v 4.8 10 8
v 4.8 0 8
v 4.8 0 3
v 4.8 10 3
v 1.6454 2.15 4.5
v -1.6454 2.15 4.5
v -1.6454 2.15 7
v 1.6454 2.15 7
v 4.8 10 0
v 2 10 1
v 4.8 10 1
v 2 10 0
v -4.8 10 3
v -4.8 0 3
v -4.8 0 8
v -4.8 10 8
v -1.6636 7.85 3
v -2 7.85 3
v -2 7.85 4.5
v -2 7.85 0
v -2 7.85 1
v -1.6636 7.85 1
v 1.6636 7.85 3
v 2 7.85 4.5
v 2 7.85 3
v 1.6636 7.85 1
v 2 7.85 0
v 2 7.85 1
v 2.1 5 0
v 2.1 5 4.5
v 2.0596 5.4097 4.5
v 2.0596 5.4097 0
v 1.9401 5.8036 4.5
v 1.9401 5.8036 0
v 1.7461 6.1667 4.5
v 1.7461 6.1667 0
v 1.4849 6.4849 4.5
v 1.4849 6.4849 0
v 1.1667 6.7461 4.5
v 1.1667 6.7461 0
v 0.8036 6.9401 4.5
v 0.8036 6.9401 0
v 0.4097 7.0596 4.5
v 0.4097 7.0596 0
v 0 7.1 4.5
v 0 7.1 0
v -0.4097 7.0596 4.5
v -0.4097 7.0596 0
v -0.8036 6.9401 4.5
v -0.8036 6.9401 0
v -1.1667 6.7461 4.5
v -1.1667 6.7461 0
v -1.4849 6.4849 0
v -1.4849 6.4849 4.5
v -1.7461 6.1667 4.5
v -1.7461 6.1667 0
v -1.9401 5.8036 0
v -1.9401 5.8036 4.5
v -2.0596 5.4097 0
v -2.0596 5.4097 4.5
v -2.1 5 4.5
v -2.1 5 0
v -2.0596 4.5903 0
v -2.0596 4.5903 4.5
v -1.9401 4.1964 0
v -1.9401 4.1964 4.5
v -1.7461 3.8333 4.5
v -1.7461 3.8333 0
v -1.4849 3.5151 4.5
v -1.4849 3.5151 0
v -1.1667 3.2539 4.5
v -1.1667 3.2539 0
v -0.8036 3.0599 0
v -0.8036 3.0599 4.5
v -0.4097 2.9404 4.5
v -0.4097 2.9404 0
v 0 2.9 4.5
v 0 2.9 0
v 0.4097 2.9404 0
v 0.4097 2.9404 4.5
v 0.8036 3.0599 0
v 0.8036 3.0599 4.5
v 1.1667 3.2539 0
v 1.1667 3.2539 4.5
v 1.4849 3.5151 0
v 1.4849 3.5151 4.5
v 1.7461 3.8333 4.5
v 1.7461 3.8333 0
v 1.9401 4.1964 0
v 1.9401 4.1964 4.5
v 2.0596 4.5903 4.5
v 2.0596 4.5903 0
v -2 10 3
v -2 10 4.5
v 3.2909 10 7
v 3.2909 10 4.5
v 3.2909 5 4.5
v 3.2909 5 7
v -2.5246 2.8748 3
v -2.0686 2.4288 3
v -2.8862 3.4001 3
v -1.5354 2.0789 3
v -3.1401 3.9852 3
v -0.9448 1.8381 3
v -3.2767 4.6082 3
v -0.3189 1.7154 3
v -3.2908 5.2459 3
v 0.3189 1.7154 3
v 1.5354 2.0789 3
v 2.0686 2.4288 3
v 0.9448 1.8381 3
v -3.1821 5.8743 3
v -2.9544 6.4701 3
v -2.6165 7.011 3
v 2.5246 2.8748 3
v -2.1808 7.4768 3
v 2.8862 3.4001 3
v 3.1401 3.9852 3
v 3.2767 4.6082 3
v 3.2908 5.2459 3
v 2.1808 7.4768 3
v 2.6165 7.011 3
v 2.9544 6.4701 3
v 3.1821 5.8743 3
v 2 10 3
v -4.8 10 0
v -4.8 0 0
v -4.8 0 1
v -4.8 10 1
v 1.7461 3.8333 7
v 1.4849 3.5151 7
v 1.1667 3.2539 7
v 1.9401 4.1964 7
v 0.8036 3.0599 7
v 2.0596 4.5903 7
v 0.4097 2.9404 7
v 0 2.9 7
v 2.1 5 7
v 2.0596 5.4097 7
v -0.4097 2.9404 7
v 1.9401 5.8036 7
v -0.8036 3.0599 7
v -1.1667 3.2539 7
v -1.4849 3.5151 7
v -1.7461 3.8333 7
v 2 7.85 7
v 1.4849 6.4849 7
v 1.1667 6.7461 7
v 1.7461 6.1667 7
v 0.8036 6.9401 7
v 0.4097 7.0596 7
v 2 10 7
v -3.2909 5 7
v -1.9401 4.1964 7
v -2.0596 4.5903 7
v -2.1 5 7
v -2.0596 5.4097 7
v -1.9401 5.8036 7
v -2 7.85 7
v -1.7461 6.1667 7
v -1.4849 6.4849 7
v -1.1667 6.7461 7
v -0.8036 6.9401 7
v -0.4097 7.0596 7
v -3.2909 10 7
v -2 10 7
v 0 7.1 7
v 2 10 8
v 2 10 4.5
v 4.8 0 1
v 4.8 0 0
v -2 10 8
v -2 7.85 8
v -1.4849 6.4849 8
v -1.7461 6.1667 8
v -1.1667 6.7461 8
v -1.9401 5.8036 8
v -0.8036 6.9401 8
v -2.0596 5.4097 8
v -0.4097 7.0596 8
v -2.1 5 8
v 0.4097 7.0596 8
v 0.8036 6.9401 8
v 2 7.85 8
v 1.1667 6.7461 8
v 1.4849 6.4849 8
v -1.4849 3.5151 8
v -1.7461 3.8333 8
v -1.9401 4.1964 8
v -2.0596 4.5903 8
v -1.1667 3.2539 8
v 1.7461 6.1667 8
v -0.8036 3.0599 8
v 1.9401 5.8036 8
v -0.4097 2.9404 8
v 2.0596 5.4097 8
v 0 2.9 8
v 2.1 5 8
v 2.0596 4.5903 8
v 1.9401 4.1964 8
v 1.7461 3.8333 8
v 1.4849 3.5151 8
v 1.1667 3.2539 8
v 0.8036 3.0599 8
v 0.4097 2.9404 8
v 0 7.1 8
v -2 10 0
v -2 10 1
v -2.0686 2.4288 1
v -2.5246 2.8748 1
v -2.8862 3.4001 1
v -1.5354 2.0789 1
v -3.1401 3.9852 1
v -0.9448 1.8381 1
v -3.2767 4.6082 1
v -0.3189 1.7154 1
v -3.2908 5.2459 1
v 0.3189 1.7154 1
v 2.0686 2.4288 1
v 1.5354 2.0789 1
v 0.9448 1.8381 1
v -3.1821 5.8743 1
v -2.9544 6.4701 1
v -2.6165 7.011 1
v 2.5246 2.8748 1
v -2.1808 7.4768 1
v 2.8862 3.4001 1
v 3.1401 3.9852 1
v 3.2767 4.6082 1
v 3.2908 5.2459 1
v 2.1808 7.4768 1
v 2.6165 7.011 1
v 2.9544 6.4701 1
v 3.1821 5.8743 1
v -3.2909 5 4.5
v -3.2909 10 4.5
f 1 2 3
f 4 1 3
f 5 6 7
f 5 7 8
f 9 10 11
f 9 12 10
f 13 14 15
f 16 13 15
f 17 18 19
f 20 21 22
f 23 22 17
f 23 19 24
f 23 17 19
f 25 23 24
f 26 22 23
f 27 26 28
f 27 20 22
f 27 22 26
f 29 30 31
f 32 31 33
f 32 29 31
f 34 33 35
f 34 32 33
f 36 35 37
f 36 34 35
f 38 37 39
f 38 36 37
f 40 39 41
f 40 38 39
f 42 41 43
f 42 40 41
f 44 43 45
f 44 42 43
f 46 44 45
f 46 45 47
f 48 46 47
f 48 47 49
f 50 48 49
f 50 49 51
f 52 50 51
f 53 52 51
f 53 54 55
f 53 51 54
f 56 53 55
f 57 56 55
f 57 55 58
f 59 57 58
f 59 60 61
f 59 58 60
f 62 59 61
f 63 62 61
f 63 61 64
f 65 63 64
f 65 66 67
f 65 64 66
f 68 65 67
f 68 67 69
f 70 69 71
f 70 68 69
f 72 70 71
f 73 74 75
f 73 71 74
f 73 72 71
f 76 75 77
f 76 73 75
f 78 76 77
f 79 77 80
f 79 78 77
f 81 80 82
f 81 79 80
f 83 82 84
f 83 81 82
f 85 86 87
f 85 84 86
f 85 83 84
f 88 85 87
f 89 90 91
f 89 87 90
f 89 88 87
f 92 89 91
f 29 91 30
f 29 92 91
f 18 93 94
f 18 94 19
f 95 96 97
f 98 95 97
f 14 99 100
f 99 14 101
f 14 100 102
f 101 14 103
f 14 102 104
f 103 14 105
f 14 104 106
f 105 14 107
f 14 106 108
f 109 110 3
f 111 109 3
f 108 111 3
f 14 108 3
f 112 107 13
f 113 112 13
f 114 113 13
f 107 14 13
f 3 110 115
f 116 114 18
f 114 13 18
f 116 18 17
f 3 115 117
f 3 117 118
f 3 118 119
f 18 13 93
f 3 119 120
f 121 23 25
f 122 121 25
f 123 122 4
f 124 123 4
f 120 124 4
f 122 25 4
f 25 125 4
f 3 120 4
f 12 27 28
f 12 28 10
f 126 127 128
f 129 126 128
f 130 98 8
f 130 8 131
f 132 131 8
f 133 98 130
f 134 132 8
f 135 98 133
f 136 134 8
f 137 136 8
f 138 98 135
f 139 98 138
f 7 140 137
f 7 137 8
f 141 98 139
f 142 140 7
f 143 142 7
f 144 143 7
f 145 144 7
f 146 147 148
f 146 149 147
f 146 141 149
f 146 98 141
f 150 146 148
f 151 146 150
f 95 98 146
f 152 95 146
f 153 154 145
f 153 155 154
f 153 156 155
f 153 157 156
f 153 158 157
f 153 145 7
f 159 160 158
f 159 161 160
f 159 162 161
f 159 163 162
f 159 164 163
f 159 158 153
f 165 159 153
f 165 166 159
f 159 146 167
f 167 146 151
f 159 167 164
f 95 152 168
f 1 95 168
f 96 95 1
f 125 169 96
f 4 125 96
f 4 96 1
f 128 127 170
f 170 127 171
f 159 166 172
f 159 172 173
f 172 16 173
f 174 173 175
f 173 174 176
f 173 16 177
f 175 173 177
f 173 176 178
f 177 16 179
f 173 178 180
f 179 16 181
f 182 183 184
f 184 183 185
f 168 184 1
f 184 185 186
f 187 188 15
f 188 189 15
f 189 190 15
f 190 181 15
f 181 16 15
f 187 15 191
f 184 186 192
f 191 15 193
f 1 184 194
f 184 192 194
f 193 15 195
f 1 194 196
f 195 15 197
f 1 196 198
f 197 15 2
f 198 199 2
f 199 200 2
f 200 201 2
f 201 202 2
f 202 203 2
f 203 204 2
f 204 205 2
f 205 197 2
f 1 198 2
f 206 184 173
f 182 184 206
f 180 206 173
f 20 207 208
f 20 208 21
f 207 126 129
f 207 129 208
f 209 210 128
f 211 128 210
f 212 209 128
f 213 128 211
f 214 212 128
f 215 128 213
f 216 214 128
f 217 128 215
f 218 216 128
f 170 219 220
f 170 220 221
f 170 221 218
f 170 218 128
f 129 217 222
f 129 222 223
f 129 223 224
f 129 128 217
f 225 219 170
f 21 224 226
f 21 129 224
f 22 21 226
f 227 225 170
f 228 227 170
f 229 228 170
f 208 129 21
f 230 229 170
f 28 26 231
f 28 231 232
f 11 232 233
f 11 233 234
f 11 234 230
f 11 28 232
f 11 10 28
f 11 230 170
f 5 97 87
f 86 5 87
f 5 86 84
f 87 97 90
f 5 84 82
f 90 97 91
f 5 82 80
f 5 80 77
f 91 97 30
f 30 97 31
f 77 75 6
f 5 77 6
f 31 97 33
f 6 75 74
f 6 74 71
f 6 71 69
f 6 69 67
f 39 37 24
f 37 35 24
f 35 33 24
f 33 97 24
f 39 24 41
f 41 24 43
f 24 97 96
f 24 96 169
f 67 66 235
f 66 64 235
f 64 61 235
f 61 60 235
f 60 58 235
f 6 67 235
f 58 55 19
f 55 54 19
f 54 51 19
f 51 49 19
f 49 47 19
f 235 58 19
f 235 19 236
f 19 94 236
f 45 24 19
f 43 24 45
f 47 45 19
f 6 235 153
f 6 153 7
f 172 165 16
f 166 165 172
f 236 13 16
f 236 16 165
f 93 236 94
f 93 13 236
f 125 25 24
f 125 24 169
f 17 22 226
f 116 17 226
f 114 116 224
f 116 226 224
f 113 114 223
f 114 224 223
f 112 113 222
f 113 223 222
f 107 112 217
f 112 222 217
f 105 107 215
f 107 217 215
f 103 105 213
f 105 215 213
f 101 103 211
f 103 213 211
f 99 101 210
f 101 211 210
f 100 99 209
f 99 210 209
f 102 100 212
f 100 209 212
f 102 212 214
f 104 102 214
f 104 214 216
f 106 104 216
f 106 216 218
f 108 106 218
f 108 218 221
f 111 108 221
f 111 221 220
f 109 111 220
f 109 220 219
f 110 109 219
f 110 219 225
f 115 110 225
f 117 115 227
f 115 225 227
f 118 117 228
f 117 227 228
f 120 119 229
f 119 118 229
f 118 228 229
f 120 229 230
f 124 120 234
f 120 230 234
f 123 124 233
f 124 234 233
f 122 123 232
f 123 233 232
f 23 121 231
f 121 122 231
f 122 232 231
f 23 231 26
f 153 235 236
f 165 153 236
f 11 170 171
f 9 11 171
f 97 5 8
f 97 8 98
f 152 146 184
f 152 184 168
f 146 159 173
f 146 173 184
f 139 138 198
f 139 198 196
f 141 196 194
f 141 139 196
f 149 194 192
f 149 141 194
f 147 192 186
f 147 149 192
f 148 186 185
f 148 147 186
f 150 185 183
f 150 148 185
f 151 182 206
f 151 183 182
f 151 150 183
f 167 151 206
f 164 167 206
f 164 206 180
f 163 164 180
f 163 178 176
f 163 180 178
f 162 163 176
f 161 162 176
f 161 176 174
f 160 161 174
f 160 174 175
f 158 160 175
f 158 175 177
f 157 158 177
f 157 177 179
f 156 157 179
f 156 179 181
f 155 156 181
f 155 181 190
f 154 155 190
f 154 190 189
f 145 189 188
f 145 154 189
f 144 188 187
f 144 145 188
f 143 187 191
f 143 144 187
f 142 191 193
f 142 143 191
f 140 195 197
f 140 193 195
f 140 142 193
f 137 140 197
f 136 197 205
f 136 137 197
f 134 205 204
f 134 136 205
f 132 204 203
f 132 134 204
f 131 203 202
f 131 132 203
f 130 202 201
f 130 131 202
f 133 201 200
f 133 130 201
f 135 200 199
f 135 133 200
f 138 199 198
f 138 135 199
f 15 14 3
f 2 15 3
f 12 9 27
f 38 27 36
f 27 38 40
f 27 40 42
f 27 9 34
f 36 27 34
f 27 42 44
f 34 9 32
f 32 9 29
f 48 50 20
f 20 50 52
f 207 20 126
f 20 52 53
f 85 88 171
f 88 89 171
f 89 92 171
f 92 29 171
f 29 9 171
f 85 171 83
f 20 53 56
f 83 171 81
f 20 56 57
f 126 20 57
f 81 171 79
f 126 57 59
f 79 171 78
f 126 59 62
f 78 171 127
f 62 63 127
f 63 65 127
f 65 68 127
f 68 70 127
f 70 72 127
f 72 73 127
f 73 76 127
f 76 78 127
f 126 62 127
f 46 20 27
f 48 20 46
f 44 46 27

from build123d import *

# Parameters (mm, degrees)
BOSS_EXTRUDE1_DEPTH = 10
CUT_EXTRUDE1_START  = 4.5
CUT_EXTRUDE1_DEPTH  = 2.5
SKETCH3_R           = 2.1
CUT_EXTRUDE2_DEPTH  = 9
CUT_EXTRUDE7_START  = 1
SKETCH4_W           = 11.6
SKETCH4_H           = 12
SKETCH4_R           = 3.3
CUT_EXTRUDE7_DEPTH  = 2


with BuildPart() as part:
    # Sketch1 → Boss-Extrude1 (new body)
    with BuildSketch(Plane(origin=(0, 0, 0), x_dir=(1, 0, 0), z_dir=(0, 1, 0))):
        Polygon((4.8, 0), (0, 0), (-4.8, 0), (-4.8, -8), (4.8, -8), align=None)
    extrude(amount=BOSS_EXTRUDE1_DEPTH)

    # Sketch2 → Cut-Extrude1 (cut)
    with BuildSketch(Plane.XY.offset(CUT_EXTRUDE1_START)):
        Polygon((3.290896534, 10), (3.290896534, 5), (1.645448267, 7.85), (-1.645448267, 7.85), (-3.290896534, 5), (-3.290896534, 10), align=None)
        Polygon((-1.645448267, 2.15), (1.645448267, 2.15), (3.290896534, 5), (1.645448267, 7.85), (-1.645448267, 7.85), (-3.290896534, 5), align=None)
    extrude(amount=CUT_EXTRUDE1_DEPTH, mode=Mode.SUBTRACT)

    # Sketch3 → Cut-Extrude2 (cut, through all)
    with BuildSketch(Plane.XY):
        with Locations((0, 5)):
            Circle(SKETCH3_R)
        Polygon((0, 7.85), (2, 7.85), (2, 10), (-2, 10), (-2, 7.85), align=None)
    extrude(amount=CUT_EXTRUDE2_DEPTH, mode=Mode.SUBTRACT)

    # Sketch4 → Cut-Extrude7 (cut)
    with BuildSketch(Plane.XY.offset(CUT_EXTRUDE7_START)):
        with Locations((0, 5)):
            Rectangle(SKETCH4_W, SKETCH4_H)
        with Locations((0, 5)):
            Circle(SKETCH4_R, mode=Mode.SUBTRACT)
    extrude(amount=CUT_EXTRUDE7_DEPTH, mode=Mode.SUBTRACT)


solid = part.part
